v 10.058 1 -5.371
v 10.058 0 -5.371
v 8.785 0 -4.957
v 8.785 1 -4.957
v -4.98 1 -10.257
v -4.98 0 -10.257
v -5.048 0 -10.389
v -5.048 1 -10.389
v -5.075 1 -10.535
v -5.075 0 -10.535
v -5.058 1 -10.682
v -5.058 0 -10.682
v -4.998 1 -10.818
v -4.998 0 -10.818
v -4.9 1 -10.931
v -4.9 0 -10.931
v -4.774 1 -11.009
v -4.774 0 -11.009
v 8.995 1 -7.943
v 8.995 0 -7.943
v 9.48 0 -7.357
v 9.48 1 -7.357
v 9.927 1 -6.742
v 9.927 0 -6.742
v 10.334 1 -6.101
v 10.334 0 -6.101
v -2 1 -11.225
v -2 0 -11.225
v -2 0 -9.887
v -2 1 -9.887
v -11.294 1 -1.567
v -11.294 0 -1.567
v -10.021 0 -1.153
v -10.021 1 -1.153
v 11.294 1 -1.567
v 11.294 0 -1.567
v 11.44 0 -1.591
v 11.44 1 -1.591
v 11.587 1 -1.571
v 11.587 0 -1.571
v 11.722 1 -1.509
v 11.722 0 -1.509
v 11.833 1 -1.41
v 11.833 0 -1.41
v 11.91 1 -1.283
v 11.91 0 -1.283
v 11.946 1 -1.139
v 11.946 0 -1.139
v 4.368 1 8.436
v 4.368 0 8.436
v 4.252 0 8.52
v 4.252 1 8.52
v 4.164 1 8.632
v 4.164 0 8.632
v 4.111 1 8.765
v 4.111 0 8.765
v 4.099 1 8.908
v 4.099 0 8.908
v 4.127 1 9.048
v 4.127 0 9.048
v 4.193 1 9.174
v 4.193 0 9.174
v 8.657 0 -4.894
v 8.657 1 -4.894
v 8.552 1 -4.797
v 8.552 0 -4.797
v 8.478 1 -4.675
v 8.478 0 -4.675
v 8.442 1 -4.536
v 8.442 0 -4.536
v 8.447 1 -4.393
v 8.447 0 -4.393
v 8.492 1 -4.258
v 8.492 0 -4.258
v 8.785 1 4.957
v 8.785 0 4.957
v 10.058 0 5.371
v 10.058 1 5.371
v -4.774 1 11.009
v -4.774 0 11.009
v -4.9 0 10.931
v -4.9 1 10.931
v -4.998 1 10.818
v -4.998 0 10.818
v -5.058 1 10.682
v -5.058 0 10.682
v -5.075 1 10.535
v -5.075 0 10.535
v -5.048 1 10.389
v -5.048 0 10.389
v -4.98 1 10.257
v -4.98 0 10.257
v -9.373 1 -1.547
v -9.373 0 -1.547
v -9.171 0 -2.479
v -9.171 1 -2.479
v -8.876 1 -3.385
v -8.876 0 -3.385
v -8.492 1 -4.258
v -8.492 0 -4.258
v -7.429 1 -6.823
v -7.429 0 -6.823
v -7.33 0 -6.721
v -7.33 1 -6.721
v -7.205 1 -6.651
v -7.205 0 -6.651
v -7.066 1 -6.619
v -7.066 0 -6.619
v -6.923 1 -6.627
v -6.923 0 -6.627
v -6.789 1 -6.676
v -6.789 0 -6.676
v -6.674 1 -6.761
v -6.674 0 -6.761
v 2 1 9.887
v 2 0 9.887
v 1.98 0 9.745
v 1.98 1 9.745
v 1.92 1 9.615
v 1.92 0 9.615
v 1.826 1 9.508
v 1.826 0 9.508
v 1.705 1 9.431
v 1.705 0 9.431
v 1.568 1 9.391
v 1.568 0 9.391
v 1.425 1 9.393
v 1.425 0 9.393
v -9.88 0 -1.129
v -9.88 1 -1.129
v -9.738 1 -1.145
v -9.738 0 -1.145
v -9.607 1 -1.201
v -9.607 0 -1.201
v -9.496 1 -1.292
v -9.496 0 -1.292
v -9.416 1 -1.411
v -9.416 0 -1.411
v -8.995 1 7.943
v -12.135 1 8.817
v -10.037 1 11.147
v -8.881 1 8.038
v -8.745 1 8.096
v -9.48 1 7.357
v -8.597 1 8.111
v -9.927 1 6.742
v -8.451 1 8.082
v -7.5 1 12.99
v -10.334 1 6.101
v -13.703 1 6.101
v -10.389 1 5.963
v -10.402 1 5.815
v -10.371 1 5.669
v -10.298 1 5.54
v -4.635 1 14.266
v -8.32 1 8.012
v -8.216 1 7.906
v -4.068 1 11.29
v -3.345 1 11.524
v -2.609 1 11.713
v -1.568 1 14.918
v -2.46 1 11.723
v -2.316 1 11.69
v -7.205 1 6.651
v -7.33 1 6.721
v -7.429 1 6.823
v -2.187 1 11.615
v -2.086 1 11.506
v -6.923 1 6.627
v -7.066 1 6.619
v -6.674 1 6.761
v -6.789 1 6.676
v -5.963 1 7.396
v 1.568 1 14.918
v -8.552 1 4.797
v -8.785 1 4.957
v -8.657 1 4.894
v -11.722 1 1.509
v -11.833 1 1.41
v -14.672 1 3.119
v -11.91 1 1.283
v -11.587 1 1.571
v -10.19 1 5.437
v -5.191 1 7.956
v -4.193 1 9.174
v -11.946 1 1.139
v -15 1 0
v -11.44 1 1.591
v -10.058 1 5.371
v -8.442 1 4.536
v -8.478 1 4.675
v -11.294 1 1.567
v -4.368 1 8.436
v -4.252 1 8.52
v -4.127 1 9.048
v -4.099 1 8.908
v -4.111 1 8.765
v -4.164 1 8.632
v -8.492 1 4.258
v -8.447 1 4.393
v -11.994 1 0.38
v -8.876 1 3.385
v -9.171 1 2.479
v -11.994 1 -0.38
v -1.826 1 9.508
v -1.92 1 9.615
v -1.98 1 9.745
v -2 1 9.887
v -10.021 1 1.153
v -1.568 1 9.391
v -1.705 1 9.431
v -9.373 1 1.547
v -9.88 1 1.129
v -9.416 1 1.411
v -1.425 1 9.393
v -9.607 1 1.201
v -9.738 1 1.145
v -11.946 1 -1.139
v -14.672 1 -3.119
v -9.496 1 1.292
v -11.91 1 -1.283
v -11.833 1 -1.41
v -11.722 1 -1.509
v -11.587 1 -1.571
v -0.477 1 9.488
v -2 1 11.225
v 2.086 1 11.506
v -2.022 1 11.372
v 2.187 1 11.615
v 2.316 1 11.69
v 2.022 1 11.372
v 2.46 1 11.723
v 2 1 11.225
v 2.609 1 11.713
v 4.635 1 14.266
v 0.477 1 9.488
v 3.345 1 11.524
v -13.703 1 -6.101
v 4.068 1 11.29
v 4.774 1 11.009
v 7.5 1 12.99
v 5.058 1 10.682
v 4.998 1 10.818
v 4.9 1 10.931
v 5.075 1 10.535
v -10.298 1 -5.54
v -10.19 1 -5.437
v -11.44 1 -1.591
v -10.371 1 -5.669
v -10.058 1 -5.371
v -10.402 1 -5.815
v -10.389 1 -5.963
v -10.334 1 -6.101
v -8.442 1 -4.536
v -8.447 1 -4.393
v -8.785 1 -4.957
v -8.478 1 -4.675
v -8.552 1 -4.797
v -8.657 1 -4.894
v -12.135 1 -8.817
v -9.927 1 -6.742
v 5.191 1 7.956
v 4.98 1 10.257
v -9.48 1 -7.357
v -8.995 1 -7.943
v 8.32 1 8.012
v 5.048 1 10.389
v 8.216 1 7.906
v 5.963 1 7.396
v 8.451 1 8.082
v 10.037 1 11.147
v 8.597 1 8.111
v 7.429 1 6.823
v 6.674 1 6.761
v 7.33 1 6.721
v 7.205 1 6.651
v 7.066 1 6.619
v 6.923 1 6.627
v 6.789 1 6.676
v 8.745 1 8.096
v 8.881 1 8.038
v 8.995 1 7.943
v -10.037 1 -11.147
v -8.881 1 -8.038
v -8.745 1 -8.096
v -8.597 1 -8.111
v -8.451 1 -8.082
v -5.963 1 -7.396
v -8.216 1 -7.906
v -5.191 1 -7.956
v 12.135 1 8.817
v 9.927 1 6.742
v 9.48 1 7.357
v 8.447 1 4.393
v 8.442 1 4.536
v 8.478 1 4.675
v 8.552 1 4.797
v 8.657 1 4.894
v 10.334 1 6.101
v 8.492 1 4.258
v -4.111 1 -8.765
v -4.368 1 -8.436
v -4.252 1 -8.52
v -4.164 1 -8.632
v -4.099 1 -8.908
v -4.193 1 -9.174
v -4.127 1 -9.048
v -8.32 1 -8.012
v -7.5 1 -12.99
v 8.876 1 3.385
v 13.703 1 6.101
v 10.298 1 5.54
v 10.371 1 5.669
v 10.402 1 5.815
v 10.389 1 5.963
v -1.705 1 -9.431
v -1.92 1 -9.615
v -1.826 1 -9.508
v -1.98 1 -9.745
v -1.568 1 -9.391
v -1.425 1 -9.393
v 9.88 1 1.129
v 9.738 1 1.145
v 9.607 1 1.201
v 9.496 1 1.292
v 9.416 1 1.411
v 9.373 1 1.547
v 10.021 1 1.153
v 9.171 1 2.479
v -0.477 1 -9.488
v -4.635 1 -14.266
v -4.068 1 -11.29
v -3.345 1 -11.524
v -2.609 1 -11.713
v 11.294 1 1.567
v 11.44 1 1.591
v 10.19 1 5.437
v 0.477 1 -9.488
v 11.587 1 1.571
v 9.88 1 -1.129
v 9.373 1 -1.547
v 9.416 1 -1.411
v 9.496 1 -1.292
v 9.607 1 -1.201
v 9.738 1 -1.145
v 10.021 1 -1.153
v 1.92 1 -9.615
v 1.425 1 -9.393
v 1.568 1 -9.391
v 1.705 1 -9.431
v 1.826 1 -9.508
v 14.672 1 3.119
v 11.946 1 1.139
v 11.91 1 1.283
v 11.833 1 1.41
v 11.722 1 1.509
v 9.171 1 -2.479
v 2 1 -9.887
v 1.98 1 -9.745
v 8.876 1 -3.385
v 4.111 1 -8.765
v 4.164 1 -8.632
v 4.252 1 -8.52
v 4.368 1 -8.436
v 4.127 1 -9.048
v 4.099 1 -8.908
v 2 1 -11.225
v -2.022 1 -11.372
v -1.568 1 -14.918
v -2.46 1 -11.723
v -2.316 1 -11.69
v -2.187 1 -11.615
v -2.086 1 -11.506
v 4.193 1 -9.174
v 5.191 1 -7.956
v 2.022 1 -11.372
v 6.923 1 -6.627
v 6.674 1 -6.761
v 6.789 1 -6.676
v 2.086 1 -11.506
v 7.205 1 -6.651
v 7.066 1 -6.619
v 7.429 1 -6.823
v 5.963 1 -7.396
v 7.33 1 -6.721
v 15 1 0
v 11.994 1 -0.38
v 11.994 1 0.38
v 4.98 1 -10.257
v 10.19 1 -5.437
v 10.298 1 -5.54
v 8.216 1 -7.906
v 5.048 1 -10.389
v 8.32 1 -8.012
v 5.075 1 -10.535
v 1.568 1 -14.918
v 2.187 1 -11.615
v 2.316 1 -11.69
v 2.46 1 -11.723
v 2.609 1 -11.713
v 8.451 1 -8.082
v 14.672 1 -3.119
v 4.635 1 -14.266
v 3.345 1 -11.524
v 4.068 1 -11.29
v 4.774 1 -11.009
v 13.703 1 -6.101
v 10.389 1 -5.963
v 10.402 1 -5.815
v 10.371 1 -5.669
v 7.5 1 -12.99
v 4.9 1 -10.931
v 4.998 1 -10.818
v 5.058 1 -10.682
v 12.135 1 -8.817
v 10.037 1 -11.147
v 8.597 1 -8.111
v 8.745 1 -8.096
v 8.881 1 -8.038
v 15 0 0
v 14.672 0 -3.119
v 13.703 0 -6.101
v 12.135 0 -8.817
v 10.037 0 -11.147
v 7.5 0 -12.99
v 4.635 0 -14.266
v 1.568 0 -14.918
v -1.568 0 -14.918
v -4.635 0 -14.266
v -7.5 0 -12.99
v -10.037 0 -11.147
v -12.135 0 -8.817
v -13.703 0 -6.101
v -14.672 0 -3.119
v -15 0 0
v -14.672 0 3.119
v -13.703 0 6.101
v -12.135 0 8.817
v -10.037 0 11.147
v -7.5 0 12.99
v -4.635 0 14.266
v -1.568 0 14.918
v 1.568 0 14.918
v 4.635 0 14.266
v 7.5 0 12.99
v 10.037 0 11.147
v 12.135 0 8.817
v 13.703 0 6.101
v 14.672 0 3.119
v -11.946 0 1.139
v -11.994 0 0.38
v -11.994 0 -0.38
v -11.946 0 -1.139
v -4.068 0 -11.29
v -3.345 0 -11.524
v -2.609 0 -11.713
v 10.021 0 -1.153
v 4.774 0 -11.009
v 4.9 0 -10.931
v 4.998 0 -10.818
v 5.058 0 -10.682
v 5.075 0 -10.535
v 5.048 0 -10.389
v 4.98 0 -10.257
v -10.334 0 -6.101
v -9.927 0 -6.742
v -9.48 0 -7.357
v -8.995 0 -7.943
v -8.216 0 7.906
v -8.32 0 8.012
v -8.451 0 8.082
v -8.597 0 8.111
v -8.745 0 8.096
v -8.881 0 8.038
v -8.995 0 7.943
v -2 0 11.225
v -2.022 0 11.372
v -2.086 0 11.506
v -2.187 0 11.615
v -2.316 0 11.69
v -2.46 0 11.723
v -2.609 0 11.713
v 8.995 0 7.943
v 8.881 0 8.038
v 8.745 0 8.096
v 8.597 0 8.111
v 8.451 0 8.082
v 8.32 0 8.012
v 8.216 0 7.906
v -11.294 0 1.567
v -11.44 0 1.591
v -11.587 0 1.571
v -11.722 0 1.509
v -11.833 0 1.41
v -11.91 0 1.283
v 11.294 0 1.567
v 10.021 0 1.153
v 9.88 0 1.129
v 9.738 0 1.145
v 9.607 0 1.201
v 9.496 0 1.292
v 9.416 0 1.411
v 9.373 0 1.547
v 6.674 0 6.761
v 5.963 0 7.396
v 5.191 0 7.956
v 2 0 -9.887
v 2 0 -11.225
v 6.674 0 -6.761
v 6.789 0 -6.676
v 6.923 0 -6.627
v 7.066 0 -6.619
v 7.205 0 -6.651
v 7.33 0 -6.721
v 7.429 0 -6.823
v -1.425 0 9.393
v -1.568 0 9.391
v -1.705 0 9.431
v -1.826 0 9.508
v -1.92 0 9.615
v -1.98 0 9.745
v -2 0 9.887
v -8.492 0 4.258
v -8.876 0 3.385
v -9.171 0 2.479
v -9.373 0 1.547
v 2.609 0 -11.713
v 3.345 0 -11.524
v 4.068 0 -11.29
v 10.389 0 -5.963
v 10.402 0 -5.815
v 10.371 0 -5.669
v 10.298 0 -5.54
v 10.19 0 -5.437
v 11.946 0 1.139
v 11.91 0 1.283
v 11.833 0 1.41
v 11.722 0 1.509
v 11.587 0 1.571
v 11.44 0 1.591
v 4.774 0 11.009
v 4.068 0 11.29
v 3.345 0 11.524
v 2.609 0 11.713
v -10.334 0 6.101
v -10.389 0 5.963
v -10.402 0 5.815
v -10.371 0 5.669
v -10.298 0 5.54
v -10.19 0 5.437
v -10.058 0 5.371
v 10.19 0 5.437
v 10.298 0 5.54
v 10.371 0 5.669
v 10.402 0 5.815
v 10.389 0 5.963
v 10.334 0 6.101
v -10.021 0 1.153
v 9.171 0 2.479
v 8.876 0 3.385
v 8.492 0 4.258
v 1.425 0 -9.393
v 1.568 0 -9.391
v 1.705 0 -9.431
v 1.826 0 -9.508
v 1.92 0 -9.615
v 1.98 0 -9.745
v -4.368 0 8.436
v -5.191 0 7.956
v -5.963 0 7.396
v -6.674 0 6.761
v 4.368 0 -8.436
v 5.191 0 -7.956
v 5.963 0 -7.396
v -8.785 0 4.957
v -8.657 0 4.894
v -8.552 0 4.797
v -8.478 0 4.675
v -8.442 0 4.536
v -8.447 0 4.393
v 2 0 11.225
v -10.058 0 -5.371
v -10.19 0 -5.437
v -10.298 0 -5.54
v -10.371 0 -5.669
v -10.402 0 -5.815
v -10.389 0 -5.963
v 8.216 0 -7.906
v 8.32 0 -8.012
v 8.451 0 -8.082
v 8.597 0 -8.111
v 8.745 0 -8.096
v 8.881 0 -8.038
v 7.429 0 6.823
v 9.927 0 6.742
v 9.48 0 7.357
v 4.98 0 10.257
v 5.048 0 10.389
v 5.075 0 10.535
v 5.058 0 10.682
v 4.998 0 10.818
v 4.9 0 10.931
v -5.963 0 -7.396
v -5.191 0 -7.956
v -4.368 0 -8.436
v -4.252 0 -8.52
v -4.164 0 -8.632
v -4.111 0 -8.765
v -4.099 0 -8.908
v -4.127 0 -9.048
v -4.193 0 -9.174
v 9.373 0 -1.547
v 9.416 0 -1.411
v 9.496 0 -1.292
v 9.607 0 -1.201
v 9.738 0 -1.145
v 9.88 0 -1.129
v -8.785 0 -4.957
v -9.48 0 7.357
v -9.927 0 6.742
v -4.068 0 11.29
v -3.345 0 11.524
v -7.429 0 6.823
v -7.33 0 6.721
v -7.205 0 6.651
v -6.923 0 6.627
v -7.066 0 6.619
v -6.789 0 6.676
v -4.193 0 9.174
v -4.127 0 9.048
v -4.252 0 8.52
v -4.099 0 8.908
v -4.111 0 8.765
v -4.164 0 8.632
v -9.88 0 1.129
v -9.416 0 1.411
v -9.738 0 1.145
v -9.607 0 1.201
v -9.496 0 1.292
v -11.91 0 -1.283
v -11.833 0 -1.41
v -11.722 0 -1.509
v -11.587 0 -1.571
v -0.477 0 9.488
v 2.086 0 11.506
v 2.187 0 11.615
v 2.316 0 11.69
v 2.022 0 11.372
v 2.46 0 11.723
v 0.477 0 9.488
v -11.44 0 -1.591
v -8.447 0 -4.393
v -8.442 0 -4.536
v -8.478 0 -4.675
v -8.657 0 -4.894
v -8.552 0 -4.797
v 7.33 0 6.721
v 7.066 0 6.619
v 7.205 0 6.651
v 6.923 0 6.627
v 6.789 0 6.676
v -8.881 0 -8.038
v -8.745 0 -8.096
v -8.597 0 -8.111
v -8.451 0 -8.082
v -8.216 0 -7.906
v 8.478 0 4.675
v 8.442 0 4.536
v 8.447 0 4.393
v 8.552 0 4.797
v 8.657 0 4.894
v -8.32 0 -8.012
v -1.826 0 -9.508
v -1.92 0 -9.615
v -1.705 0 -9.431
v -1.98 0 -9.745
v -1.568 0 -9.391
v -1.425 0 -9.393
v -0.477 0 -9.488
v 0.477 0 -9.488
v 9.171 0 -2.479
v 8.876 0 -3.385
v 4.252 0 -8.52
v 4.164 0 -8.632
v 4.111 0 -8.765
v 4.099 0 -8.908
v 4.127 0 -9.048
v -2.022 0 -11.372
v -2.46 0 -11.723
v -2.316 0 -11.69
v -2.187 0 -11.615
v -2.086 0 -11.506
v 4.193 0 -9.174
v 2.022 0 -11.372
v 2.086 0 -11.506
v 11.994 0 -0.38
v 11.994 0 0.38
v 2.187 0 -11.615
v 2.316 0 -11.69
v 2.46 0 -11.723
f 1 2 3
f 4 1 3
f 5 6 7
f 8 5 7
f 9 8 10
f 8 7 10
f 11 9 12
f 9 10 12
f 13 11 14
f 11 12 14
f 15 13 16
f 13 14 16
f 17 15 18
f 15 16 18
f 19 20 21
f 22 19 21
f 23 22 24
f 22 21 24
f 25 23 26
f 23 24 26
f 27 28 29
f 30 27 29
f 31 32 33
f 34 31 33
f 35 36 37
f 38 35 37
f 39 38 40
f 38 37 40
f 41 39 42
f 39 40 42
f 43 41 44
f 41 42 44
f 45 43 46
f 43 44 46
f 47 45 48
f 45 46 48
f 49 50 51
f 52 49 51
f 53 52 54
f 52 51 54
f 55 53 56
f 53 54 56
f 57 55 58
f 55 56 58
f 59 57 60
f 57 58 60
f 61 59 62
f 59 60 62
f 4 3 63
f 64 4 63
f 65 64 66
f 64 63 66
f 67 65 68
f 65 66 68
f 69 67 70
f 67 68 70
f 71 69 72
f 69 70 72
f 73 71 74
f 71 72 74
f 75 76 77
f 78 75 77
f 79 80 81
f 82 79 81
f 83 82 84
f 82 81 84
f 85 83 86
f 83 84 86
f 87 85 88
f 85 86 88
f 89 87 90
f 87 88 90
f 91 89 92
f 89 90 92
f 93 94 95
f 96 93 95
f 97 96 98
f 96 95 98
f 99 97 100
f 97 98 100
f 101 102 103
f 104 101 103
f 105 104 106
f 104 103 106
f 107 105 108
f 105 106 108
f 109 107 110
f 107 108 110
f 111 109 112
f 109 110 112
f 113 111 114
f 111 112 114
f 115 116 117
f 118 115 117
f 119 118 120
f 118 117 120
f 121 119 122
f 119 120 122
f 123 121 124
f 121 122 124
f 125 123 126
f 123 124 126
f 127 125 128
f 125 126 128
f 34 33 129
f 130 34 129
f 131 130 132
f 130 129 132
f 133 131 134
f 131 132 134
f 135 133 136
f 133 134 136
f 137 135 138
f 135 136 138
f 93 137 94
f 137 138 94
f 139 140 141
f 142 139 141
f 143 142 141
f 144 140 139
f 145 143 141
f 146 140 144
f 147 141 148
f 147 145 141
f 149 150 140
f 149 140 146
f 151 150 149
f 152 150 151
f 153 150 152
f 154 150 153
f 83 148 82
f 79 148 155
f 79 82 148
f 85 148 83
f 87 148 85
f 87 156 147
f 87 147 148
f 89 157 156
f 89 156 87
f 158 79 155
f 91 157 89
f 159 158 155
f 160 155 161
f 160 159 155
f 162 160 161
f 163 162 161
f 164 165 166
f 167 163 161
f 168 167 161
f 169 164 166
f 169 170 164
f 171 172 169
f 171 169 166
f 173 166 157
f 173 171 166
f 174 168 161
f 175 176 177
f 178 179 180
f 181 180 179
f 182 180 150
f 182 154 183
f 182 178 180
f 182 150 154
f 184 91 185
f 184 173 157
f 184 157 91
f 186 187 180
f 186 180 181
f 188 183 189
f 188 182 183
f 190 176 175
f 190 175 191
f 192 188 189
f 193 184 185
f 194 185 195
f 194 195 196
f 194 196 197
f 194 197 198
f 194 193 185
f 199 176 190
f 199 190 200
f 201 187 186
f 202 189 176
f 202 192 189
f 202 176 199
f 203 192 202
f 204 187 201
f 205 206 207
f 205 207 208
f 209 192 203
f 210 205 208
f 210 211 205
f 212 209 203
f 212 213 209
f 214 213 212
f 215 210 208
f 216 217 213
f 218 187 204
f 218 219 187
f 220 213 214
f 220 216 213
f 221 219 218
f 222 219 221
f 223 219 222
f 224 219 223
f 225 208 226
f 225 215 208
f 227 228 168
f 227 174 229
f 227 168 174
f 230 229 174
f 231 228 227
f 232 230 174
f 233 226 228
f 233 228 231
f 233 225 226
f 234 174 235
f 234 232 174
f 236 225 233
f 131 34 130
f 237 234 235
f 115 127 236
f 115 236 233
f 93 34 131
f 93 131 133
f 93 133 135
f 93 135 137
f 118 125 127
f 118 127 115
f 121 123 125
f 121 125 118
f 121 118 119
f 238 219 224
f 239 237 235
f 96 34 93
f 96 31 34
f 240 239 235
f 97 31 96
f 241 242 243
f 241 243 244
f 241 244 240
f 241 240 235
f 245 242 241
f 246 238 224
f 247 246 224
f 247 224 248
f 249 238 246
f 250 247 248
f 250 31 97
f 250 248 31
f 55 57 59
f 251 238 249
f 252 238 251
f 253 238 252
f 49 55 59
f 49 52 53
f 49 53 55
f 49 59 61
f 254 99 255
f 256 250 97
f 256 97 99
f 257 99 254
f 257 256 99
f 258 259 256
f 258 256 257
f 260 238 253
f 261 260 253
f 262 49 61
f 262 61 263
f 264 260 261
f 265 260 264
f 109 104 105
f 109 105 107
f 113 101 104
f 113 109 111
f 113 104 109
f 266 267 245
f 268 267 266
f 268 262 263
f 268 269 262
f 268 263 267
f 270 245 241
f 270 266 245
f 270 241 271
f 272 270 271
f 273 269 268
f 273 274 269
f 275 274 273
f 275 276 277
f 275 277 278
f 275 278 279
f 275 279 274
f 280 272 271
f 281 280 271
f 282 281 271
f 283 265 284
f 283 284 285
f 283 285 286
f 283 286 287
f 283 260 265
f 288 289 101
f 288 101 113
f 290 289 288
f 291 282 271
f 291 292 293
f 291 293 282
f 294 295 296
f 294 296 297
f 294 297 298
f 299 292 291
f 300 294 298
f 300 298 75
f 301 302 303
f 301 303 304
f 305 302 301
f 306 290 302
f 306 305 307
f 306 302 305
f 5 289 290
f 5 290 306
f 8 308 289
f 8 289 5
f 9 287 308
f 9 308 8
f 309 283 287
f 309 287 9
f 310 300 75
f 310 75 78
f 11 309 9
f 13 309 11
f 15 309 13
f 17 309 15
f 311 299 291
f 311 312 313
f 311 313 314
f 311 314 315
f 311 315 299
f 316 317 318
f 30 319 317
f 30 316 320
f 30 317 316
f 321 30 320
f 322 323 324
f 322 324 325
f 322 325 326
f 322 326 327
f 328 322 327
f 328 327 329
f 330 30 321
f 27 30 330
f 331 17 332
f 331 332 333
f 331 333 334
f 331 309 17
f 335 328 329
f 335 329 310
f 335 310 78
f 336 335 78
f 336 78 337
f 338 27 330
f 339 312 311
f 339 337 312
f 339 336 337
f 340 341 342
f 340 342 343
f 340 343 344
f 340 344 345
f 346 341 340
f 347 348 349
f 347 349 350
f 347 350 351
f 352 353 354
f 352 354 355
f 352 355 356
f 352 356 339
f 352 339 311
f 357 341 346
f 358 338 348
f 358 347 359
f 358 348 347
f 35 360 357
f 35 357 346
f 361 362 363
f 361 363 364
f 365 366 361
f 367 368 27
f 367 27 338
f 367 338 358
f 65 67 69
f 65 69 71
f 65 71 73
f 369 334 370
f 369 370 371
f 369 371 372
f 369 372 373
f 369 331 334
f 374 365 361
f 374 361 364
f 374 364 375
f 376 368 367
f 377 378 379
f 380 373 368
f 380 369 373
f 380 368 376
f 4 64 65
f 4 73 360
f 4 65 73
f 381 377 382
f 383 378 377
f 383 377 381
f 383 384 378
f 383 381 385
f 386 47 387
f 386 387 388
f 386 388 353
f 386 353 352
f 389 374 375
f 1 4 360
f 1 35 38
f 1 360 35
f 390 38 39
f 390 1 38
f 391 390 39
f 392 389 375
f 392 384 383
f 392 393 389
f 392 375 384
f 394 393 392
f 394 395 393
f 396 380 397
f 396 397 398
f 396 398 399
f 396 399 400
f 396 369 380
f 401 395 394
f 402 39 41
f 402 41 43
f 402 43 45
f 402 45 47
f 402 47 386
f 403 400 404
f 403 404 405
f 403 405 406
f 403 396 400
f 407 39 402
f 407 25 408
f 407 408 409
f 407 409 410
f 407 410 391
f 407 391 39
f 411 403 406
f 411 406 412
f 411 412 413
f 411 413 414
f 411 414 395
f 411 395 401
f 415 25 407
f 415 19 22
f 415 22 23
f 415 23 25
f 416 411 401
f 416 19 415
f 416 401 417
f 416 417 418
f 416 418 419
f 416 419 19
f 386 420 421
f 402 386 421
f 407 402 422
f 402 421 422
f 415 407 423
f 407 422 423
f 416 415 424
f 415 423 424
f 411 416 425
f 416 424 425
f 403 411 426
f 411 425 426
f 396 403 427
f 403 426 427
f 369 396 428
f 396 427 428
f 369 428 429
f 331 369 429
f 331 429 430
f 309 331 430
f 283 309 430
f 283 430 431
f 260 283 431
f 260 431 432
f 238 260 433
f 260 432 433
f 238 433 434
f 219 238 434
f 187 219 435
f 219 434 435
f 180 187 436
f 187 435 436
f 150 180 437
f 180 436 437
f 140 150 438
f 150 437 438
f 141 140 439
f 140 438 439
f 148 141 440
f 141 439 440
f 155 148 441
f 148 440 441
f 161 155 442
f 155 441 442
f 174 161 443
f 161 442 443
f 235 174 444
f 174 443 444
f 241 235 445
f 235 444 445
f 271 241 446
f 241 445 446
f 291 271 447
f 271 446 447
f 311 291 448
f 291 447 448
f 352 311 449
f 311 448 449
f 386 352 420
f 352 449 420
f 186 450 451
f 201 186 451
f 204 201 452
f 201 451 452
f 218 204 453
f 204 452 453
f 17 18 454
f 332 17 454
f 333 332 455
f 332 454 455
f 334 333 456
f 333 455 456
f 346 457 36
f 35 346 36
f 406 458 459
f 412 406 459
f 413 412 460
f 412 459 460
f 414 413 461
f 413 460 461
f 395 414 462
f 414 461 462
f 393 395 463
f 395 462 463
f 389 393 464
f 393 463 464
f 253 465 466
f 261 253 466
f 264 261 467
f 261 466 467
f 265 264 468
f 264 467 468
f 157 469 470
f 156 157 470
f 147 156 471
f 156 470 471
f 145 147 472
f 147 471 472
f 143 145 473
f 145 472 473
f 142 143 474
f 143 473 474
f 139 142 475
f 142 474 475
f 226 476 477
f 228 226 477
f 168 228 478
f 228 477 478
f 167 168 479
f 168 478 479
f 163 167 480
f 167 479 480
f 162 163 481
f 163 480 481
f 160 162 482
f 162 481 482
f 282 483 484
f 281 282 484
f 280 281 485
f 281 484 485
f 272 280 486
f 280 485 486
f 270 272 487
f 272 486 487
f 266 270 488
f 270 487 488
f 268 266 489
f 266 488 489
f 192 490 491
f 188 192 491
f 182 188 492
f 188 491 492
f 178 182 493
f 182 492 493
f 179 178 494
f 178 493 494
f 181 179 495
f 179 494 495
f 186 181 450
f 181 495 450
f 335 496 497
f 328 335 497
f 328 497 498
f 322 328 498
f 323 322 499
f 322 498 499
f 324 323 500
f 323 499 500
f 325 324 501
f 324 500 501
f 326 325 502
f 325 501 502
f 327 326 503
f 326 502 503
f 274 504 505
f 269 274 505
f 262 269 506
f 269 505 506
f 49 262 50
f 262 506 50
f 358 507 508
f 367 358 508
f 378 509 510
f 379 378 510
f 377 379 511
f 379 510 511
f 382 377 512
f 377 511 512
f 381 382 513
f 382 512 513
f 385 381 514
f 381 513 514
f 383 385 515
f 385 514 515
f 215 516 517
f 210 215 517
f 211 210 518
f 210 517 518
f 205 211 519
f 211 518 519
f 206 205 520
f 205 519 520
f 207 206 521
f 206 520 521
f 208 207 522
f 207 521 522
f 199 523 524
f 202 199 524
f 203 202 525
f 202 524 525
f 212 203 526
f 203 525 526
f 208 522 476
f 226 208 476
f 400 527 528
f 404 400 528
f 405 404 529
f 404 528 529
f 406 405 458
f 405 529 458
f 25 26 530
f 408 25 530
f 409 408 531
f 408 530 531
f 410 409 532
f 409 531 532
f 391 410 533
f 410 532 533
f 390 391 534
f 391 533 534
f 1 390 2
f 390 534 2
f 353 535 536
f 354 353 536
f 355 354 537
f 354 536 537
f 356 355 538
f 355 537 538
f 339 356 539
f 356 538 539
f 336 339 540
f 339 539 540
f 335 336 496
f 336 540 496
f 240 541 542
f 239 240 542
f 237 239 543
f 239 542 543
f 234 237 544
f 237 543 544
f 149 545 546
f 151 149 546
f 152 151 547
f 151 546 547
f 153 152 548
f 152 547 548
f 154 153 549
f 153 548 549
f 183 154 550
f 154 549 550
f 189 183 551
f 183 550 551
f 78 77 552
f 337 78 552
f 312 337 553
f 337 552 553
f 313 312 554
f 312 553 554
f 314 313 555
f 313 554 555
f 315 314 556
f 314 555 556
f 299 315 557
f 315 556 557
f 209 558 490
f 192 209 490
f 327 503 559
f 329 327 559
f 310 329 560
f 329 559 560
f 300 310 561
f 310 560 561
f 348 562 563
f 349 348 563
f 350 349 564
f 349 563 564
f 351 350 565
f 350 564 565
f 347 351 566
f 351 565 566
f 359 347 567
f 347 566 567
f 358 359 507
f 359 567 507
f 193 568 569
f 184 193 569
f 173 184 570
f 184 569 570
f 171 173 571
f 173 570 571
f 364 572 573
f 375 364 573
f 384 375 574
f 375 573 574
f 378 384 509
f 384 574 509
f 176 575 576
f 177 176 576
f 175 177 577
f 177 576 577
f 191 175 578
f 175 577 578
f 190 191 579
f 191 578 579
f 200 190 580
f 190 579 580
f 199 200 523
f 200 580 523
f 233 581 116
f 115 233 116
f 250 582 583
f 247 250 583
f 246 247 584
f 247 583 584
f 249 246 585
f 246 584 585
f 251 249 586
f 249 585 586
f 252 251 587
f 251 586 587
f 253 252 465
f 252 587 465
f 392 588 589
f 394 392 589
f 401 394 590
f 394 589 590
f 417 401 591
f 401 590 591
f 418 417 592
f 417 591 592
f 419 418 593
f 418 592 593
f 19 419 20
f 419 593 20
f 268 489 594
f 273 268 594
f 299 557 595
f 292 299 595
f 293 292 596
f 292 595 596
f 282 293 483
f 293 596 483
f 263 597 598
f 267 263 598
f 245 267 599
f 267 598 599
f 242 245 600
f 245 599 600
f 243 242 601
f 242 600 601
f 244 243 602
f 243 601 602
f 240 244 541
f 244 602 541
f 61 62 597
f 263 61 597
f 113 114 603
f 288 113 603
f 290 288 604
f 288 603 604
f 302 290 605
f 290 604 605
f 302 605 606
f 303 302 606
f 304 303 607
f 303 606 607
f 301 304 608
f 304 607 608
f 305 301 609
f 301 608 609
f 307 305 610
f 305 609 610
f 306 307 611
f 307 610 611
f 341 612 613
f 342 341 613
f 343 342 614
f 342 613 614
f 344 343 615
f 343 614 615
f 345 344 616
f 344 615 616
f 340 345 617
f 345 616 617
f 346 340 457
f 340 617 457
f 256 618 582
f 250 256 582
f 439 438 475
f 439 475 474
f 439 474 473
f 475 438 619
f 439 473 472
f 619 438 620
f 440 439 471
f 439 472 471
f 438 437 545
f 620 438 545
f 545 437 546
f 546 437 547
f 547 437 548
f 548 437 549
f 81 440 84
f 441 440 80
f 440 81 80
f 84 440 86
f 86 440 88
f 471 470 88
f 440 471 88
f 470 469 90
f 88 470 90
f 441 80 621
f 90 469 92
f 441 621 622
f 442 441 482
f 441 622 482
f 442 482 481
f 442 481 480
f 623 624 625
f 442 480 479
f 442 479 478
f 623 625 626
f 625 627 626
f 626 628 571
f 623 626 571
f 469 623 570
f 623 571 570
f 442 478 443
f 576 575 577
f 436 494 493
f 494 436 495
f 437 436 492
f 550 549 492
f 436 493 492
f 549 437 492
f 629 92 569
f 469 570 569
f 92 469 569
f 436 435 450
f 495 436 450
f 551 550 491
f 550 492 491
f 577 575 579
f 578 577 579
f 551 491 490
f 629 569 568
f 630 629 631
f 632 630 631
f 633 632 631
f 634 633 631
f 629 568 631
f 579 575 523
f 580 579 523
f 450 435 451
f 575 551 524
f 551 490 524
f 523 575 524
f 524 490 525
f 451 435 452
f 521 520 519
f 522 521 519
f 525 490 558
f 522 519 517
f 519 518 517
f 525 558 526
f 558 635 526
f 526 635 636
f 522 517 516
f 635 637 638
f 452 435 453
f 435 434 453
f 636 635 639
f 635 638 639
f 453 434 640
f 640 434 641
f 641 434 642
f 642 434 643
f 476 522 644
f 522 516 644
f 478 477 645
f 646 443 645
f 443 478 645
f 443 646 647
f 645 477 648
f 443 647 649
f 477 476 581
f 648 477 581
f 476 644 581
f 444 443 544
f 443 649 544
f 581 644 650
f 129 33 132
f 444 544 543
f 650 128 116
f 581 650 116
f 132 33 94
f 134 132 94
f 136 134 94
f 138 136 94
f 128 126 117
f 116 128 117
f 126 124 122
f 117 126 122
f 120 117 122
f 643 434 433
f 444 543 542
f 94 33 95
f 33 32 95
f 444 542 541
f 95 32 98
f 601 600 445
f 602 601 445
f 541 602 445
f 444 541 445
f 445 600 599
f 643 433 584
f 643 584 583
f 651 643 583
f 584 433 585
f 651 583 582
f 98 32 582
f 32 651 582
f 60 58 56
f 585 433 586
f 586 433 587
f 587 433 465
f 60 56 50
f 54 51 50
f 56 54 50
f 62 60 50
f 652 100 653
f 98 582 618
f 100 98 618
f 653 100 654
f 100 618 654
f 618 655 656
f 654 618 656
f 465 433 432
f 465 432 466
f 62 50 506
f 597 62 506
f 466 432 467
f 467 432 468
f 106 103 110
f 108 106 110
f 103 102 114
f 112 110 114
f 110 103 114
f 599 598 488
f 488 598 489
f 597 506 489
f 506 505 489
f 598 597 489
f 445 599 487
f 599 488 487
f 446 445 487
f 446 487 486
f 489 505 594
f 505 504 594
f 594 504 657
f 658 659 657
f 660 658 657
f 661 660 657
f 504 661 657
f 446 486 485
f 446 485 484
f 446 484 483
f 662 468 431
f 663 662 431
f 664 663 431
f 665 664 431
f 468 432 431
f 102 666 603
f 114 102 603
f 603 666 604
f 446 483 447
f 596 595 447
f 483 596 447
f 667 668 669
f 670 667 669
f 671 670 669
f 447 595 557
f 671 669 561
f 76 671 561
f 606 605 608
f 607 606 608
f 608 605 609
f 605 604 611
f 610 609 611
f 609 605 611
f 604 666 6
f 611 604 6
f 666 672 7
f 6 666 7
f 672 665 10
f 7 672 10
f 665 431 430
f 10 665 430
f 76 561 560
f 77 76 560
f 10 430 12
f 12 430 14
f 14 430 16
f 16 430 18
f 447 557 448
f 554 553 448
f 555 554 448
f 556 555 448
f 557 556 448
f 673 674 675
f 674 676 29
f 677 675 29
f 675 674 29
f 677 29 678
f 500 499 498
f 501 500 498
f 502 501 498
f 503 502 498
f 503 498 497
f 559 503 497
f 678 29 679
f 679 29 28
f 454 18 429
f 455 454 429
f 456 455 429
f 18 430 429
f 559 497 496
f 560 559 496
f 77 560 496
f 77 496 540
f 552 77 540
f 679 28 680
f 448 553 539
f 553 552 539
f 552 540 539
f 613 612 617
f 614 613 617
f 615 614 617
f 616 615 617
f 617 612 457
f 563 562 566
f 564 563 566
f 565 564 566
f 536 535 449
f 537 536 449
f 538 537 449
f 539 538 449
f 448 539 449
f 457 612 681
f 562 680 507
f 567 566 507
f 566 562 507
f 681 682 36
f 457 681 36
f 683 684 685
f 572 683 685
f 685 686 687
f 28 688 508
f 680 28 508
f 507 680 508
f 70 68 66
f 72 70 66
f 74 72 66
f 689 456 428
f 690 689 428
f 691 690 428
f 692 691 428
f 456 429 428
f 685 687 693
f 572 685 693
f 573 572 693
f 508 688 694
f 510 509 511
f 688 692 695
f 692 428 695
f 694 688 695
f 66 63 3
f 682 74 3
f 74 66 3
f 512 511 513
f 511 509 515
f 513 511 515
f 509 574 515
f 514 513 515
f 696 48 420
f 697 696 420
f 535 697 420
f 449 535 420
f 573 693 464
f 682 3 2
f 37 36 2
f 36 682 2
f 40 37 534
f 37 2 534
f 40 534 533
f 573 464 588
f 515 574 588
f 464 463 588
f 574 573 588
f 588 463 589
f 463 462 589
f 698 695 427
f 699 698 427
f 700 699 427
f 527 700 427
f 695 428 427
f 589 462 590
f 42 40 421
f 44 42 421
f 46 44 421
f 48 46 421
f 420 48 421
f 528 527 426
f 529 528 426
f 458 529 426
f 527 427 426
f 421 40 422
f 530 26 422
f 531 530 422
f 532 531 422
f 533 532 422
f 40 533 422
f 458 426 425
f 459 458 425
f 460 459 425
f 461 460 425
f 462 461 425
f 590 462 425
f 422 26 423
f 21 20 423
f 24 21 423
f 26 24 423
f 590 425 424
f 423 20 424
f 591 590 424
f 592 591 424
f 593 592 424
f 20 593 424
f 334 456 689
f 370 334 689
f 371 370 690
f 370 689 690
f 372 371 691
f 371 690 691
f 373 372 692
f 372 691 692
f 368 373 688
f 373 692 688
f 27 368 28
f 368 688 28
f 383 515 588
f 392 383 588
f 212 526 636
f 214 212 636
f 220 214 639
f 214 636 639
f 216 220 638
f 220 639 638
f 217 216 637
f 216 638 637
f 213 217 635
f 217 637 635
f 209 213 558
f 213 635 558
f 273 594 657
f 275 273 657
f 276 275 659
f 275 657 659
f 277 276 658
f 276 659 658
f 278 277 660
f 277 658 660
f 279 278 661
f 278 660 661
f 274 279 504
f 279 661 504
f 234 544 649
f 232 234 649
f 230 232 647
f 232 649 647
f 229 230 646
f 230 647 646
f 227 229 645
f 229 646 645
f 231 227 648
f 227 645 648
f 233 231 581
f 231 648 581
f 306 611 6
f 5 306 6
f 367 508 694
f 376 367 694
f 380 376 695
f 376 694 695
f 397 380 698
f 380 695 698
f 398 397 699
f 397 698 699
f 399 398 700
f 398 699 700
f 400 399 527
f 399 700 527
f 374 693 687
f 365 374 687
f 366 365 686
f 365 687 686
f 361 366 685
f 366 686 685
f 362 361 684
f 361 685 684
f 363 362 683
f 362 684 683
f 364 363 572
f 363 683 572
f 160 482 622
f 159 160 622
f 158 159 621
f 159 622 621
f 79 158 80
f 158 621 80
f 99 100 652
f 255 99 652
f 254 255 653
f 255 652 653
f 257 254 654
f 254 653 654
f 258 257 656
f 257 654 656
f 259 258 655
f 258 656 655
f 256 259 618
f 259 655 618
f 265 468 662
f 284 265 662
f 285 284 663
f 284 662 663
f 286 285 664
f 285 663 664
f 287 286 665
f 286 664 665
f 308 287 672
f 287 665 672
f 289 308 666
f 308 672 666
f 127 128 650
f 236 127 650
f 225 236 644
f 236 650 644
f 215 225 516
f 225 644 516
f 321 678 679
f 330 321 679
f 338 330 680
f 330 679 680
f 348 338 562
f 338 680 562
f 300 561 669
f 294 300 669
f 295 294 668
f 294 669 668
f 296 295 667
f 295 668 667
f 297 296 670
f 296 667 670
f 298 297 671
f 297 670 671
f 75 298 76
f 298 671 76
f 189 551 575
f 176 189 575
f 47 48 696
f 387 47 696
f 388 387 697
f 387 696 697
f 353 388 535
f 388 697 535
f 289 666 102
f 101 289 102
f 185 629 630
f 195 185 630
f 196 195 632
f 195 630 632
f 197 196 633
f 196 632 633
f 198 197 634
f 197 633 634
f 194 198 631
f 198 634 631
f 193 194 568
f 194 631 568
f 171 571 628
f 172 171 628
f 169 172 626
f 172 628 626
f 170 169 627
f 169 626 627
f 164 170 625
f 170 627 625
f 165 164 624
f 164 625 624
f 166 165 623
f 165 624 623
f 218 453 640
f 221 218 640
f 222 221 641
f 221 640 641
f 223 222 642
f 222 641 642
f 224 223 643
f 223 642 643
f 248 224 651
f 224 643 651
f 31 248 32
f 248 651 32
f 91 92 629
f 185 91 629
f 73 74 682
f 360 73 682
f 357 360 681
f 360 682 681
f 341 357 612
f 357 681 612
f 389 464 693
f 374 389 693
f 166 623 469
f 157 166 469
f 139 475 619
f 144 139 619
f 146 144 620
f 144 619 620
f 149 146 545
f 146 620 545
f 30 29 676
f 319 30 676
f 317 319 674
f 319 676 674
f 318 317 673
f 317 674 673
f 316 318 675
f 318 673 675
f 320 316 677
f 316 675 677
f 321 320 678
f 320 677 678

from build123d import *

# Parameters (mm, degrees)
SKETCH1_R           = 15
BOSS_EXTRUDE1_DEPTH = 1


with BuildPart() as part:
    # Sketch1 → Boss-Extrude1 (new body)
    with BuildSketch(Plane(origin=(0, 0, 0), x_dir=(1, 0, 0), z_dir=(0, 1, 0))):
        Circle(SKETCH1_R)
        with BuildLine():
            Line((-2, 11.22497216), (-2, 9.886859967))
            ThreePointArc((-2, 9.886859967), (-1.82596012, 9.507716194), (-1.425, 9.392516968))
            ThreePointArc((-1.425, 9.392516968), (0, 9.5), (1.425, 9.392516968))
            ThreePointArc((1.425, 9.392516968), (1.82596012, 9.507716194), (2, 9.886859967))
            Line((2, 9.886859967), (2, 11.22497216))
            ThreePointArc((2, 11.22497216), (2.187228379, 11.615066909), (2.608695652, 11.713014428))
            ThreePointArc((2.608695652, 11.713014428), (3.708203932, 11.412678196), (4.774258025, 11.00938056))
            ThreePointArc((4.774258025, 11.00938056), (5.057660104, 10.682407105), (4.979839104, 10.256763744))
            Line((4.979839104, 10.256763744), (4.193316491, 9.174208239))
            ThreePointArc((4.193316491, 9.174208239), (4.111262594, 8.765176409), (4.367933739, 8.436299832))
            ThreePointArc((4.367933739, 8.436299832), (5.583959897, 7.685661447), (6.673632173, 6.761111863))
            ThreePointArc((6.673632173, 6.761111863), (7.06572813, 6.618631549), (7.429384469, 6.823067229))
            Line((7.429384469, 6.823067229), (8.215907082, 7.905622735))
            ThreePointArc((8.215907082, 7.905622735), (8.596669963, 8.111165936), (8.995216257, 7.942674896))
            ThreePointArc((8.995216257, 7.942674896), (9.708203932, 7.053423028), (10.333607408, 6.100537513))
            ThreePointArc((10.333607408, 6.100537513), (10.370694331, 5.669430868), (10.05754893, 5.370820192))
            Line((10.05754893, 5.370820192), (8.784928608, 4.957320783))
            ThreePointArc((8.784928608, 4.957320783), (8.478122734, 4.674637153), (8.49246525, 4.257702899))
            ThreePointArc((8.49246525, 4.257702899), (9.035036905, 2.935661447), (9.373163684, 1.547191827))
            ThreePointArc((9.373163684, 1.547191827), (9.60662815, 1.201454611), (10.020996586, 1.153094718))
            Line((10.020996586, 1.153094718), (11.293616907, 1.566594126))
            ThreePointArc((11.293616907, 1.566594126), (11.722475811, 1.509075263), (11.945869987, 1.138503515))
            ThreePointArc((11.945869987, 1.138503515), (12, 0), (11.945869987, -1.138503515))
            ThreePointArc((11.945869987, -1.138503515), (11.722475811, -1.509075263), (11.293616907, -1.566594126))
            Line((11.293616907, -1.566594126), (10.020996586, -1.153094718))
            ThreePointArc((10.020996586, -1.153094718), (9.60662815, -1.201454611), (9.373163684, -1.547191827))
            ThreePointArc((9.373163684, -1.547191827), (9.035036905, -2.935661447), (8.49246525, -4.257702899))
            ThreePointArc((8.49246525, -4.257702899), (8.478122734, -4.674637153), (8.784928608, -4.957320783))
            Line((8.784928608, -4.957320783), (10.05754893, -5.370820192))
            ThreePointArc((10.05754893, -5.370820192), (10.370694331, -5.669430868), (10.333607408, -6.100537513))
            ThreePointArc((10.333607408, -6.100537513), (9.708203932, -7.053423028), (8.995216257, -7.942674896))
            ThreePointArc((8.995216257, -7.942674896), (8.596669963, -8.111165936), (8.215907082, -7.905622735))
            Line((8.215907082, -7.905622735), (7.429384469, -6.823067229))
            ThreePointArc((7.429384469, -6.823067229), (7.06572813, -6.618631549), (6.673632173, -6.761111863))
            ThreePointArc((6.673632173, -6.761111863), (5.583959897, -7.685661447), (4.367933739, -8.436299832))
            ThreePointArc((4.367933739, -8.436299832), (4.111262594, -8.765176409), (4.193316491, -9.174208239))
            Line((4.193316491, -9.174208239), (4.979839104, -10.256763744))
            ThreePointArc((4.979839104, -10.256763744), (5.057660104, -10.682407105), (4.774258025, -11.00938056))
            ThreePointArc((4.774258025, -11.00938056), (3.708203932, -11.412678196), (2.608695652, -11.713014428))
            ThreePointArc((2.608695652, -11.713014428), (2.187228379, -11.615066909), (2, -11.22497216))
            Line((2, -11.22497216), (2, -9.886859967))
            ThreePointArc((2, -9.886859967), (1.82596012, -9.507716194), (1.425, -9.392516968))
            ThreePointArc((1.425, -9.392516968), (0, -9.5), (-1.425, -9.392516968))
            ThreePointArc((-1.425, -9.392516968), (-1.82596012, -9.507716194), (-2, -9.886859967))
            Line((-2, -9.886859967), (-2, -11.22497216))
            ThreePointArc((-2, -11.22497216), (-2.187228379, -11.615066909), (-2.608695652, -11.713014428))
            ThreePointArc((-2.608695652, -11.713014428), (-3.708203932, -11.412678196), (-4.774258025, -11.00938056))
            ThreePointArc((-4.774258025, -11.00938056), (-5.057660104, -10.682407105), (-4.979839104, -10.256763744))
            Line((-4.979839104, -10.256763744), (-4.193316491, -9.174208239))
            ThreePointArc((-4.193316491, -9.174208239), (-4.111262594, -8.765176409), (-4.367933739, -8.436299832))
            ThreePointArc((-4.367933739, -8.436299832), (-5.583959897, -7.685661447), (-6.673632173, -6.761111863))
            ThreePointArc((-6.673632173, -6.761111863), (-7.06572813, -6.618631549), (-7.429384469, -6.823067229))
            Line((-7.429384469, -6.823067229), (-8.215907082, -7.905622735))
            ThreePointArc((-8.215907082, -7.905622735), (-8.596669963, -8.111165936), (-8.995216257, -7.942674896))
            ThreePointArc((-8.995216257, -7.942674896), (-9.708203932, -7.053423028), (-10.333607408, -6.100537513))
            ThreePointArc((-10.333607408, -6.100537513), (-10.370694331, -5.669430868), (-10.05754893, -5.370820192))
            Line((-10.05754893, -5.370820192), (-8.784928608, -4.957320783))
            ThreePointArc((-8.784928608, -4.957320783), (-8.478122734, -4.674637153), (-8.49246525, -4.257702899))
            ThreePointArc((-8.49246525, -4.257702899), (-9.035036905, -2.935661447), (-9.373163684, -1.547191827))
            ThreePointArc((-9.373163684, -1.547191827), (-9.60662815, -1.201454611), (-10.020996586, -1.153094718))
            Line((-10.020996586, -1.153094718), (-11.293616907, -1.566594126))
            ThreePointArc((-11.293616907, -1.566594126), (-11.722475811, -1.509075263), (-11.945869987, -1.138503515))
            ThreePointArc((-11.945869987, -1.138503515), (-12, 0), (-11.945869987, 1.138503515))
            ThreePointArc((-11.945869987, 1.138503515), (-11.722475811, 1.509075263), (-11.293616907, 1.566594126))
            Line((-11.293616907, 1.566594126), (-10.020996586, 1.153094718))
            ThreePointArc((-10.020996586, 1.153094718), (-9.60662815, 1.201454611), (-9.373163684, 1.547191827))
            ThreePointArc((-9.373163684, 1.547191827), (-9.035036905, 2.935661447), (-8.49246525, 4.257702899))
            ThreePointArc((-8.49246525, 4.257702899), (-8.478122734, 4.674637153), (-8.784928608, 4.957320783))
            Line((-8.784928608, 4.957320783), (-10.05754893, 5.370820192))
            ThreePointArc((-10.05754893, 5.370820192), (-10.370694331, 5.669430868), (-10.333607408, 6.100537513))
            ThreePointArc((-10.333607408, 6.100537513), (-9.708203932, 7.053423028), (-8.995216257, 7.942674896))
            ThreePointArc((-8.995216257, 7.942674896), (-8.596669963, 8.111165936), (-8.215907082, 7.905622735))
            Line((-8.215907082, 7.905622735), (-7.429384469, 6.823067229))
            ThreePointArc((-7.429384469, 6.823067229), (-7.06572813, 6.618631549), (-6.673632173, 6.761111863))
            ThreePointArc((-6.673632173, 6.761111863), (-5.583959897, 7.685661447), (-4.367933739, 8.436299832))
            ThreePointArc((-4.367933739, 8.436299832), (-4.111262594, 8.765176409), (-4.193316491, 9.174208239))
            Line((-4.193316491, 9.174208239), (-4.979839104, 10.256763744))
            ThreePointArc((-4.979839104, 10.256763744), (-5.057660104, 10.682407105), (-4.774258025, 11.00938056))
            ThreePointArc((-4.774258025, 11.00938056), (-3.708203932, 11.412678196), (-2.608695652, 11.713014428))
            ThreePointArc((-2.608695652, 11.713014428), (-2.187228379, 11.615066909), (-2, 11.22497216))
        make_face(mode=Mode.SUBTRACT)
    extrude(amount=BOSS_EXTRUDE1_DEPTH)


solid = part.part
